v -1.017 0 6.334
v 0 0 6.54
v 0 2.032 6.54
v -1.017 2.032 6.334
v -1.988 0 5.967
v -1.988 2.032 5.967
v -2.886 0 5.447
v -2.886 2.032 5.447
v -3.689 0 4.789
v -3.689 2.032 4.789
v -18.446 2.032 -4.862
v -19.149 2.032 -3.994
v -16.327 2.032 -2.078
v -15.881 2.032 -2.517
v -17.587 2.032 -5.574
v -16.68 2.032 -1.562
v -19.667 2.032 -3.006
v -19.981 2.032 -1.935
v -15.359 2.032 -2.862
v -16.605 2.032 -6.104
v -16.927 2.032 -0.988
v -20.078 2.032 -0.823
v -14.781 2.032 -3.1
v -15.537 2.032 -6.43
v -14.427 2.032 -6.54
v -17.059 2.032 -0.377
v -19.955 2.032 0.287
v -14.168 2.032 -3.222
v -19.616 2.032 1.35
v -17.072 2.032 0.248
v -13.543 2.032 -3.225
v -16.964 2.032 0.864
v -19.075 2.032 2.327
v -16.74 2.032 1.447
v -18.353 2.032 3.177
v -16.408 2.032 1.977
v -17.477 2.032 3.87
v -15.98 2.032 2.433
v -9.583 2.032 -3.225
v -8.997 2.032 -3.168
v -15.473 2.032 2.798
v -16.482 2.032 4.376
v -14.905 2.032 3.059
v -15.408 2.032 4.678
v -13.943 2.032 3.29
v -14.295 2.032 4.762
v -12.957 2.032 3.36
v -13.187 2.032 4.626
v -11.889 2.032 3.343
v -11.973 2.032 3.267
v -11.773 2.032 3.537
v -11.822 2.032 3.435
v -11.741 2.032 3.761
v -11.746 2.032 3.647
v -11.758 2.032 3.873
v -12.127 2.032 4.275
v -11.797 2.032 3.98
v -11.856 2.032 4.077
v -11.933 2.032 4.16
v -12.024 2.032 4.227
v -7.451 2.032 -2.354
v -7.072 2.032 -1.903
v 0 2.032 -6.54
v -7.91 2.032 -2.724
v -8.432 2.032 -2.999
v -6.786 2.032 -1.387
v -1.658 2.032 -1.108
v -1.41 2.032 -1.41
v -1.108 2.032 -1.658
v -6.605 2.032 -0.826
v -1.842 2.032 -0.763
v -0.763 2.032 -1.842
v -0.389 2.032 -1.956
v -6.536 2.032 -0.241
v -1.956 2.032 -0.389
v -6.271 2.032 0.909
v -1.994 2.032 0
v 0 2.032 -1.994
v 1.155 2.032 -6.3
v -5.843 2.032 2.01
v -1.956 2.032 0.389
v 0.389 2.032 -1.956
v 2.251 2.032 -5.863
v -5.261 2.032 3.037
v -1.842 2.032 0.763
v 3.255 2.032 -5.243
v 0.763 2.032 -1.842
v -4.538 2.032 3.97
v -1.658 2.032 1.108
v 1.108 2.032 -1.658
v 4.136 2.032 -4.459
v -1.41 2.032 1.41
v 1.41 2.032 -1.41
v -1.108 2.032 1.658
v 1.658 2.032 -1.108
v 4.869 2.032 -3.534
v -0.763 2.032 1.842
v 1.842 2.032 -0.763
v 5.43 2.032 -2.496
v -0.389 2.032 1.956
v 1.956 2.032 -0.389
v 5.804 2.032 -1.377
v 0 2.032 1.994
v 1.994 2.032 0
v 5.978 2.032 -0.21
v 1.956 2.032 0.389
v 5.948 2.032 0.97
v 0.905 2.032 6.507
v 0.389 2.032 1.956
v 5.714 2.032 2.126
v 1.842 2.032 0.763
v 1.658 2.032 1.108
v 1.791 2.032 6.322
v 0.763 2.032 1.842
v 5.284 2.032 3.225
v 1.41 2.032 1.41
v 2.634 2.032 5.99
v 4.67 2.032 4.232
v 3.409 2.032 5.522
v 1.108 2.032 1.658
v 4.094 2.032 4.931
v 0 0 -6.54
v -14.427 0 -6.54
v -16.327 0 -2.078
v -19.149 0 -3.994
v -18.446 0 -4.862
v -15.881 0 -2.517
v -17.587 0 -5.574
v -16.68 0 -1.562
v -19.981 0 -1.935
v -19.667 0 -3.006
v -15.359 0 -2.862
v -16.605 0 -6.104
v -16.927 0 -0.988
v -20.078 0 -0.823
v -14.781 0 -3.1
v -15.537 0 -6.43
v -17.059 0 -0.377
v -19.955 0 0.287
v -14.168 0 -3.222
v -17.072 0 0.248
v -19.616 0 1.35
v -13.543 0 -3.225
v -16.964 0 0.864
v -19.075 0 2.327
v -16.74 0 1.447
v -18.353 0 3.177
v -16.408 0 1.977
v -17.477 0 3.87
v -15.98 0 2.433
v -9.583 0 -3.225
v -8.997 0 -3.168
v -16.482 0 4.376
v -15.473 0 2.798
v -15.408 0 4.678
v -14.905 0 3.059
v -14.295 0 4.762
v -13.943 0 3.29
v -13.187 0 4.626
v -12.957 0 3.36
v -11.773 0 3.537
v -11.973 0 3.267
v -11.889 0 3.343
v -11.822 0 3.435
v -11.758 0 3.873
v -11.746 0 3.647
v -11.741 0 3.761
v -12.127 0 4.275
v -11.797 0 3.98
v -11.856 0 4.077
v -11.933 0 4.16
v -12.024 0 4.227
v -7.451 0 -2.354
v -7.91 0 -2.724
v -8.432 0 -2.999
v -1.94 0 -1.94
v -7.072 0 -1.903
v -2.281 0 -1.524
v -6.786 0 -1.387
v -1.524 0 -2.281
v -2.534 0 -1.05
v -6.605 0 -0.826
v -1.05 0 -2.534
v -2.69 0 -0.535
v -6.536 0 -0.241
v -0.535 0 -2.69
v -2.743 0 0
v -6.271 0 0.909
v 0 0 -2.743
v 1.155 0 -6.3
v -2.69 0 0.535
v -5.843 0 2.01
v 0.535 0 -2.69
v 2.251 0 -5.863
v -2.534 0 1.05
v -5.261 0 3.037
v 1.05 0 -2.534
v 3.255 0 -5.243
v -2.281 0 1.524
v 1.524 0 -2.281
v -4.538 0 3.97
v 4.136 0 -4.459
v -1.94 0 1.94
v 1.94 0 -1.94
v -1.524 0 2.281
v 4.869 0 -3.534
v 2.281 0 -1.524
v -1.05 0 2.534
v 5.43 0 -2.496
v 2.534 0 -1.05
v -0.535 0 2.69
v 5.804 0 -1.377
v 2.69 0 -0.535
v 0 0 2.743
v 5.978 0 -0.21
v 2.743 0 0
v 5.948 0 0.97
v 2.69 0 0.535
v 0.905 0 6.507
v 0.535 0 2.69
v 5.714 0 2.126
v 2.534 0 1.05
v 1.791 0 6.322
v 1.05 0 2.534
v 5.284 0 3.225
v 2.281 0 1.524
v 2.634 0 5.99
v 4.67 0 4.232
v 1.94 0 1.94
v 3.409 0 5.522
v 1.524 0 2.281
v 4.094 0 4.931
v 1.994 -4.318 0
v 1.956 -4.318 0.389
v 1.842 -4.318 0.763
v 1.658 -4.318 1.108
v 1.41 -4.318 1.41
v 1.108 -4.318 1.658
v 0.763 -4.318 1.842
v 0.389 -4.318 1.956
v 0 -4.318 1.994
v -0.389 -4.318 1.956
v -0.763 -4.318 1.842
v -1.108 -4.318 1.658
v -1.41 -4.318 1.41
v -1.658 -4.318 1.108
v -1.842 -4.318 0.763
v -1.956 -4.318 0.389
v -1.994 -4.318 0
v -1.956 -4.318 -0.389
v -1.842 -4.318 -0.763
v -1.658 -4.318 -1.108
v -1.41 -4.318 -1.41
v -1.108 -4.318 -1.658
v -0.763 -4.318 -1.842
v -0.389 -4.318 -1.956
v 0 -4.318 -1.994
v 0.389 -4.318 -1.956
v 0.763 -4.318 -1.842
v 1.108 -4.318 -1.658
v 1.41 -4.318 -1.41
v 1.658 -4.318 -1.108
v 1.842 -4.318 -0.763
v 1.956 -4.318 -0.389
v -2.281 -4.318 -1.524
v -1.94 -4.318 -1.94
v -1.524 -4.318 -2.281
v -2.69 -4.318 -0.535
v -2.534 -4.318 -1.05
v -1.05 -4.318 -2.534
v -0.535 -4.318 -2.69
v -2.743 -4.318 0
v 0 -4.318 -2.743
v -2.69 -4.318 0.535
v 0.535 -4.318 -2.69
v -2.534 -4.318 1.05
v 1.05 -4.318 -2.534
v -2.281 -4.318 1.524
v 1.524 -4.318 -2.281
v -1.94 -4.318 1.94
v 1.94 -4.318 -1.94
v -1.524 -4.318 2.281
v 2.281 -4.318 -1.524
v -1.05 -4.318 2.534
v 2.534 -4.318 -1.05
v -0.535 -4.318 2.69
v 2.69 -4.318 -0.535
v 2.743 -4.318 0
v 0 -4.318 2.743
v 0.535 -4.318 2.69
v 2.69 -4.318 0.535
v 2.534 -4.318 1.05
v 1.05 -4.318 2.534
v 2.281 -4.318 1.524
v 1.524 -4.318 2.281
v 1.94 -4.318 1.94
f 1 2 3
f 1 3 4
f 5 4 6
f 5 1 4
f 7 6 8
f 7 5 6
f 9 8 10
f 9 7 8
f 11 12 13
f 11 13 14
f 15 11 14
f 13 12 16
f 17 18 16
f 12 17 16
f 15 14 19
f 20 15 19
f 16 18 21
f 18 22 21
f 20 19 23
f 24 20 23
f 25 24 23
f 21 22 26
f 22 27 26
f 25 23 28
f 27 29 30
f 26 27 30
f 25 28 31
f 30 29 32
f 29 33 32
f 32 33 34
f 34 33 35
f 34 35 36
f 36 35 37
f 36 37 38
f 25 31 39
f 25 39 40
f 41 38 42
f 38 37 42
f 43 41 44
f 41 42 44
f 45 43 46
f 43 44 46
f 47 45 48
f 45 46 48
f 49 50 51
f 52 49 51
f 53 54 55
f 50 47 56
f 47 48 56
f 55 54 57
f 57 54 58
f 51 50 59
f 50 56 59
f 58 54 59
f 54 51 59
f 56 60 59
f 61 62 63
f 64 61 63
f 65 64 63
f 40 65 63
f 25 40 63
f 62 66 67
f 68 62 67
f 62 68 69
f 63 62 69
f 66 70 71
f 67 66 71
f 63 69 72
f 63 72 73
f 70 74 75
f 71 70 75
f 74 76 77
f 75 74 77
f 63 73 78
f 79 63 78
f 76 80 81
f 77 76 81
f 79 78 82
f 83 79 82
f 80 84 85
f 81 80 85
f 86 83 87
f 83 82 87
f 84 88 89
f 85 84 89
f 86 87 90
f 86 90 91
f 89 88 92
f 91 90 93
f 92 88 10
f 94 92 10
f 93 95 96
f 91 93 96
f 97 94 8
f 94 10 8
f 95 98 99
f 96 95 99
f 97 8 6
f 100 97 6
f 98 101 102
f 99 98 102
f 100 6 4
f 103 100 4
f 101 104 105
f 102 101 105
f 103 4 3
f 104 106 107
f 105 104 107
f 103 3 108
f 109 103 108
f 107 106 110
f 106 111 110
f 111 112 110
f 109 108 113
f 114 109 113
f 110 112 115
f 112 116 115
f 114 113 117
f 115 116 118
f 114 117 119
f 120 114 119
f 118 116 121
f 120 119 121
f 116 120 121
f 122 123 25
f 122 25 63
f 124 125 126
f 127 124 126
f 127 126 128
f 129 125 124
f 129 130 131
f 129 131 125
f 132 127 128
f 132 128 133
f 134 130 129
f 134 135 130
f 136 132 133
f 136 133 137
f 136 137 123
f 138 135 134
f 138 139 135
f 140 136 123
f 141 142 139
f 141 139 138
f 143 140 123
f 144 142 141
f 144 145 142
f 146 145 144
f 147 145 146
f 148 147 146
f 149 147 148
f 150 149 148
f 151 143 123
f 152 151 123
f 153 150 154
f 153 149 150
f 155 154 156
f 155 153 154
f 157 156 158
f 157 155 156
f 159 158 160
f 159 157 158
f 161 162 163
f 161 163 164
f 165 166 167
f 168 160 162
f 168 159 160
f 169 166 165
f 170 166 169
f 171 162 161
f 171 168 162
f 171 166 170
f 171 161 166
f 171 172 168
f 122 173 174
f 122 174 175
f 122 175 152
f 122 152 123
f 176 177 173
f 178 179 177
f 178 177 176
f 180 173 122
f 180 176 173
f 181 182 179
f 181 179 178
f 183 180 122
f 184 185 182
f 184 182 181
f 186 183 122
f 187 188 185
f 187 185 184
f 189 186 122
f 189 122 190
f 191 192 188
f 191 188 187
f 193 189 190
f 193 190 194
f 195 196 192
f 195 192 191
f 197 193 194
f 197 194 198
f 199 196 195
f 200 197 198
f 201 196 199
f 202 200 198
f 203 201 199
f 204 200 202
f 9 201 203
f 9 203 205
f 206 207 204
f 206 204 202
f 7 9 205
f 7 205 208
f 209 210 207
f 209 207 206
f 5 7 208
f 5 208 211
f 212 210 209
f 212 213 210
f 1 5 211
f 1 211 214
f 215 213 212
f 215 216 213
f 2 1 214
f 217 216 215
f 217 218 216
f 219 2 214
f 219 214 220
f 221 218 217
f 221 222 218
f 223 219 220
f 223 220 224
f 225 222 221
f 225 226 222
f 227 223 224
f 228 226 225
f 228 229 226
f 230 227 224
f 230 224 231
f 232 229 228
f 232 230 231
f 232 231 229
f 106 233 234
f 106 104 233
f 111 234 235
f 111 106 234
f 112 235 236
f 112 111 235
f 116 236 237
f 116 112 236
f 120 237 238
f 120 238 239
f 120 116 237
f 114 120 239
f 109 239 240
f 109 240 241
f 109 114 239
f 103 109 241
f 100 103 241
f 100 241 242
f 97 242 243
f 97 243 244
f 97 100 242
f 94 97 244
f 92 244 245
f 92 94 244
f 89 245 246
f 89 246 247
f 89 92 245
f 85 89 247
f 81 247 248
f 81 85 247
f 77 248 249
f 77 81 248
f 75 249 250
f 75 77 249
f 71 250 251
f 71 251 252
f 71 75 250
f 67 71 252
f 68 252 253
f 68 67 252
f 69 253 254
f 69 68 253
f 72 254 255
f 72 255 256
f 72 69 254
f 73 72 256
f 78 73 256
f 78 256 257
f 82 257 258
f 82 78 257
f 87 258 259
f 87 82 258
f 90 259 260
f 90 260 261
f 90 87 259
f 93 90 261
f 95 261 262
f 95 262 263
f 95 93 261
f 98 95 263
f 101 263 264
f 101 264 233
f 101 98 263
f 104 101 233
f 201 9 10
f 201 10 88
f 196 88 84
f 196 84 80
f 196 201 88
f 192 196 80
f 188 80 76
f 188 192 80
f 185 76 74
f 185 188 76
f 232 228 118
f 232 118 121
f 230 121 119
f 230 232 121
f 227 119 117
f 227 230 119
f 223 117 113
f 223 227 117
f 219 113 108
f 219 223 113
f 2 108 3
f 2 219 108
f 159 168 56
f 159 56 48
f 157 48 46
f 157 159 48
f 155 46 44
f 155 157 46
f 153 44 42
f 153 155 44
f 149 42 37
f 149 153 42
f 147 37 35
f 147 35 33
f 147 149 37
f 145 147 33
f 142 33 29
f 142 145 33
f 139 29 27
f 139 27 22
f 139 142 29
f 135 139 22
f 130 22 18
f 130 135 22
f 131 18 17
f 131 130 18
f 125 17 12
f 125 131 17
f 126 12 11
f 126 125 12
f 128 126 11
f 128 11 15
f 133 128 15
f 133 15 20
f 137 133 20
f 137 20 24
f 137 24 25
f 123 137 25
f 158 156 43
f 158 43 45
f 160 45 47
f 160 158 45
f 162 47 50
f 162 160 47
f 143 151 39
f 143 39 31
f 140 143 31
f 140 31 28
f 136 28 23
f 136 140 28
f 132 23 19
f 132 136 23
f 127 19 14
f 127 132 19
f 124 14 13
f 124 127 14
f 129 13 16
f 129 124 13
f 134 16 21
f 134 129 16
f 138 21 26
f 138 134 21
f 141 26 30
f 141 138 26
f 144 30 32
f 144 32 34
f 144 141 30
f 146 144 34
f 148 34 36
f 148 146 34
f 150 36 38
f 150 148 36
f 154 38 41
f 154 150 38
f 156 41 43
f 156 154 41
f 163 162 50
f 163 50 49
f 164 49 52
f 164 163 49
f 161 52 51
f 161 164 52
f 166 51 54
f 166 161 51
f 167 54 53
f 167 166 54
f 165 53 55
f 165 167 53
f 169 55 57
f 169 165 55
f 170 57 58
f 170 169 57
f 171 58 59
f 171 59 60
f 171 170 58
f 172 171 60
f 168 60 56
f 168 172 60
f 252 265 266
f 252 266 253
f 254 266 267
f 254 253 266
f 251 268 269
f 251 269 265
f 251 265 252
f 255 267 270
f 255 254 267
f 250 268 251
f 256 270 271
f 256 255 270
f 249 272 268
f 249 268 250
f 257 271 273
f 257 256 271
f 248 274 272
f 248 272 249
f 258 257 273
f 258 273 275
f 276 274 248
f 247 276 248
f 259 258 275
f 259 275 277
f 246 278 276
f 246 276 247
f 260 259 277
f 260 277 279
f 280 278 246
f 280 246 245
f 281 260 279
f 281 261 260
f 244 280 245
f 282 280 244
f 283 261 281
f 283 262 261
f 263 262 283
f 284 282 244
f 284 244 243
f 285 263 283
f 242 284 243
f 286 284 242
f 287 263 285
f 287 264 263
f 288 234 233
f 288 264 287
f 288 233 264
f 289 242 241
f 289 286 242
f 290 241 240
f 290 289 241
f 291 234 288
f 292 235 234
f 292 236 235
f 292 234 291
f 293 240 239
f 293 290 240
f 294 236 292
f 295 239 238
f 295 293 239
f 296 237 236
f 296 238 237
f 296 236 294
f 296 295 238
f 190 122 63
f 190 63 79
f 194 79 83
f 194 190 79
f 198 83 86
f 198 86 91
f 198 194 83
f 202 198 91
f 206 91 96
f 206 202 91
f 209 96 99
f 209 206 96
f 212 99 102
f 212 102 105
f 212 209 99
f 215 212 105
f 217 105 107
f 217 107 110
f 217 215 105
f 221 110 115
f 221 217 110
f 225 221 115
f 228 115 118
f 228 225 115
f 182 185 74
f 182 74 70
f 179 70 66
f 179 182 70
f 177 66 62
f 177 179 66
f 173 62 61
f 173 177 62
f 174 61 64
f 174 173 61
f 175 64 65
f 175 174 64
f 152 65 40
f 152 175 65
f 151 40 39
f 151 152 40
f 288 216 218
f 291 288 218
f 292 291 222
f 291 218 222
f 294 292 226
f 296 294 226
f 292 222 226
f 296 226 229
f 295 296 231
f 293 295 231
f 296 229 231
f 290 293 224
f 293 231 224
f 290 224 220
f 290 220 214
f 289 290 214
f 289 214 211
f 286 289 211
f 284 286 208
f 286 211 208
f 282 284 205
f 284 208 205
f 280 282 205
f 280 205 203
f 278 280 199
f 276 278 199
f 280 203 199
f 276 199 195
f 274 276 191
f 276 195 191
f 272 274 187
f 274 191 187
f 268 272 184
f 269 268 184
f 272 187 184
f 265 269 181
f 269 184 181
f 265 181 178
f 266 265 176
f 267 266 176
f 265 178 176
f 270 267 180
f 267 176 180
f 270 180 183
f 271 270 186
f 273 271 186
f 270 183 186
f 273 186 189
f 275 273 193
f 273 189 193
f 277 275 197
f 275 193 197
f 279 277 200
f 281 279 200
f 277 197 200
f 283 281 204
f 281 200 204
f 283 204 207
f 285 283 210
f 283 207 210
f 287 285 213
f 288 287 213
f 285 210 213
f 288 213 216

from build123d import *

# Parameters (mm, degrees)
F0_R     = 1.9939
F1_DEPTH = 2.032
F2_R     = 2.7432
F2_R_2   = 1.9939
F3_DEPTH = 4.318


with BuildPart() as f1:
    # F0 (on Front) → F1 (new body)
    with BuildSketch(Plane.XZ):
        with BuildLine():
            ThreePointArc((-3.6886774906, 4.7892003296), (-5.5707472579, 2.5336299725), (-6.5360625118, -0.2408881307))
            ThreePointArc((-6.5360625118, -0.2408881307), (-7.4509999469, -2.3544476099), (-9.5834042014, -3.2245604059))
            Line((-9.5834042014, -3.2245604059), (-13.5428459747, -3.2245604059))
            ThreePointArc((-13.5428459747, -3.2245604059), (-17.0080191324, -0.6859563699), (-14.9047917892, 3.0594902266))
            ThreePointArc((-14.9047917892, 3.0594902266), (-13.4518007595, 3.3451320132), (-11.9730629795, 3.2669735805))
            ThreePointArc((-11.9730629795, 3.2669735805), (-11.746814986, 3.8173410062), (-12.1273721857, 4.2747999394))
            ThreePointArc((-12.1273721857, 4.2747999394), (-19.9550226734, 0.2868008558), (-14.4265317516, -6.5405))
            Line((-14.4265317516, -6.5405), (0, -6.5405))
            ThreePointArc((0, -6.5405), (5.4303827393, -2.4959803043), (4.6703001439, 4.2322788102))
            ThreePointArc((4.6703001439, 4.2322788102), (2.6335498908, 5.9901516108), (0, 6.5405))
            ThreePointArc((0, 6.5405), (-1.9875582205, 5.9665063938), (-3.6886774906, 4.7892003296))
        make_face()
        Circle(F0_R, mode=Mode.SUBTRACT)
    extrude(amount=-F1_DEPTH)

    # F2 (on face) → F3 (join)
    with BuildSketch(Plane.XZ):
        Circle(F2_R)
        Circle(F2_R_2, mode=Mode.SUBTRACT)
    extrude(amount=F3_DEPTH)


solid = f1.part
